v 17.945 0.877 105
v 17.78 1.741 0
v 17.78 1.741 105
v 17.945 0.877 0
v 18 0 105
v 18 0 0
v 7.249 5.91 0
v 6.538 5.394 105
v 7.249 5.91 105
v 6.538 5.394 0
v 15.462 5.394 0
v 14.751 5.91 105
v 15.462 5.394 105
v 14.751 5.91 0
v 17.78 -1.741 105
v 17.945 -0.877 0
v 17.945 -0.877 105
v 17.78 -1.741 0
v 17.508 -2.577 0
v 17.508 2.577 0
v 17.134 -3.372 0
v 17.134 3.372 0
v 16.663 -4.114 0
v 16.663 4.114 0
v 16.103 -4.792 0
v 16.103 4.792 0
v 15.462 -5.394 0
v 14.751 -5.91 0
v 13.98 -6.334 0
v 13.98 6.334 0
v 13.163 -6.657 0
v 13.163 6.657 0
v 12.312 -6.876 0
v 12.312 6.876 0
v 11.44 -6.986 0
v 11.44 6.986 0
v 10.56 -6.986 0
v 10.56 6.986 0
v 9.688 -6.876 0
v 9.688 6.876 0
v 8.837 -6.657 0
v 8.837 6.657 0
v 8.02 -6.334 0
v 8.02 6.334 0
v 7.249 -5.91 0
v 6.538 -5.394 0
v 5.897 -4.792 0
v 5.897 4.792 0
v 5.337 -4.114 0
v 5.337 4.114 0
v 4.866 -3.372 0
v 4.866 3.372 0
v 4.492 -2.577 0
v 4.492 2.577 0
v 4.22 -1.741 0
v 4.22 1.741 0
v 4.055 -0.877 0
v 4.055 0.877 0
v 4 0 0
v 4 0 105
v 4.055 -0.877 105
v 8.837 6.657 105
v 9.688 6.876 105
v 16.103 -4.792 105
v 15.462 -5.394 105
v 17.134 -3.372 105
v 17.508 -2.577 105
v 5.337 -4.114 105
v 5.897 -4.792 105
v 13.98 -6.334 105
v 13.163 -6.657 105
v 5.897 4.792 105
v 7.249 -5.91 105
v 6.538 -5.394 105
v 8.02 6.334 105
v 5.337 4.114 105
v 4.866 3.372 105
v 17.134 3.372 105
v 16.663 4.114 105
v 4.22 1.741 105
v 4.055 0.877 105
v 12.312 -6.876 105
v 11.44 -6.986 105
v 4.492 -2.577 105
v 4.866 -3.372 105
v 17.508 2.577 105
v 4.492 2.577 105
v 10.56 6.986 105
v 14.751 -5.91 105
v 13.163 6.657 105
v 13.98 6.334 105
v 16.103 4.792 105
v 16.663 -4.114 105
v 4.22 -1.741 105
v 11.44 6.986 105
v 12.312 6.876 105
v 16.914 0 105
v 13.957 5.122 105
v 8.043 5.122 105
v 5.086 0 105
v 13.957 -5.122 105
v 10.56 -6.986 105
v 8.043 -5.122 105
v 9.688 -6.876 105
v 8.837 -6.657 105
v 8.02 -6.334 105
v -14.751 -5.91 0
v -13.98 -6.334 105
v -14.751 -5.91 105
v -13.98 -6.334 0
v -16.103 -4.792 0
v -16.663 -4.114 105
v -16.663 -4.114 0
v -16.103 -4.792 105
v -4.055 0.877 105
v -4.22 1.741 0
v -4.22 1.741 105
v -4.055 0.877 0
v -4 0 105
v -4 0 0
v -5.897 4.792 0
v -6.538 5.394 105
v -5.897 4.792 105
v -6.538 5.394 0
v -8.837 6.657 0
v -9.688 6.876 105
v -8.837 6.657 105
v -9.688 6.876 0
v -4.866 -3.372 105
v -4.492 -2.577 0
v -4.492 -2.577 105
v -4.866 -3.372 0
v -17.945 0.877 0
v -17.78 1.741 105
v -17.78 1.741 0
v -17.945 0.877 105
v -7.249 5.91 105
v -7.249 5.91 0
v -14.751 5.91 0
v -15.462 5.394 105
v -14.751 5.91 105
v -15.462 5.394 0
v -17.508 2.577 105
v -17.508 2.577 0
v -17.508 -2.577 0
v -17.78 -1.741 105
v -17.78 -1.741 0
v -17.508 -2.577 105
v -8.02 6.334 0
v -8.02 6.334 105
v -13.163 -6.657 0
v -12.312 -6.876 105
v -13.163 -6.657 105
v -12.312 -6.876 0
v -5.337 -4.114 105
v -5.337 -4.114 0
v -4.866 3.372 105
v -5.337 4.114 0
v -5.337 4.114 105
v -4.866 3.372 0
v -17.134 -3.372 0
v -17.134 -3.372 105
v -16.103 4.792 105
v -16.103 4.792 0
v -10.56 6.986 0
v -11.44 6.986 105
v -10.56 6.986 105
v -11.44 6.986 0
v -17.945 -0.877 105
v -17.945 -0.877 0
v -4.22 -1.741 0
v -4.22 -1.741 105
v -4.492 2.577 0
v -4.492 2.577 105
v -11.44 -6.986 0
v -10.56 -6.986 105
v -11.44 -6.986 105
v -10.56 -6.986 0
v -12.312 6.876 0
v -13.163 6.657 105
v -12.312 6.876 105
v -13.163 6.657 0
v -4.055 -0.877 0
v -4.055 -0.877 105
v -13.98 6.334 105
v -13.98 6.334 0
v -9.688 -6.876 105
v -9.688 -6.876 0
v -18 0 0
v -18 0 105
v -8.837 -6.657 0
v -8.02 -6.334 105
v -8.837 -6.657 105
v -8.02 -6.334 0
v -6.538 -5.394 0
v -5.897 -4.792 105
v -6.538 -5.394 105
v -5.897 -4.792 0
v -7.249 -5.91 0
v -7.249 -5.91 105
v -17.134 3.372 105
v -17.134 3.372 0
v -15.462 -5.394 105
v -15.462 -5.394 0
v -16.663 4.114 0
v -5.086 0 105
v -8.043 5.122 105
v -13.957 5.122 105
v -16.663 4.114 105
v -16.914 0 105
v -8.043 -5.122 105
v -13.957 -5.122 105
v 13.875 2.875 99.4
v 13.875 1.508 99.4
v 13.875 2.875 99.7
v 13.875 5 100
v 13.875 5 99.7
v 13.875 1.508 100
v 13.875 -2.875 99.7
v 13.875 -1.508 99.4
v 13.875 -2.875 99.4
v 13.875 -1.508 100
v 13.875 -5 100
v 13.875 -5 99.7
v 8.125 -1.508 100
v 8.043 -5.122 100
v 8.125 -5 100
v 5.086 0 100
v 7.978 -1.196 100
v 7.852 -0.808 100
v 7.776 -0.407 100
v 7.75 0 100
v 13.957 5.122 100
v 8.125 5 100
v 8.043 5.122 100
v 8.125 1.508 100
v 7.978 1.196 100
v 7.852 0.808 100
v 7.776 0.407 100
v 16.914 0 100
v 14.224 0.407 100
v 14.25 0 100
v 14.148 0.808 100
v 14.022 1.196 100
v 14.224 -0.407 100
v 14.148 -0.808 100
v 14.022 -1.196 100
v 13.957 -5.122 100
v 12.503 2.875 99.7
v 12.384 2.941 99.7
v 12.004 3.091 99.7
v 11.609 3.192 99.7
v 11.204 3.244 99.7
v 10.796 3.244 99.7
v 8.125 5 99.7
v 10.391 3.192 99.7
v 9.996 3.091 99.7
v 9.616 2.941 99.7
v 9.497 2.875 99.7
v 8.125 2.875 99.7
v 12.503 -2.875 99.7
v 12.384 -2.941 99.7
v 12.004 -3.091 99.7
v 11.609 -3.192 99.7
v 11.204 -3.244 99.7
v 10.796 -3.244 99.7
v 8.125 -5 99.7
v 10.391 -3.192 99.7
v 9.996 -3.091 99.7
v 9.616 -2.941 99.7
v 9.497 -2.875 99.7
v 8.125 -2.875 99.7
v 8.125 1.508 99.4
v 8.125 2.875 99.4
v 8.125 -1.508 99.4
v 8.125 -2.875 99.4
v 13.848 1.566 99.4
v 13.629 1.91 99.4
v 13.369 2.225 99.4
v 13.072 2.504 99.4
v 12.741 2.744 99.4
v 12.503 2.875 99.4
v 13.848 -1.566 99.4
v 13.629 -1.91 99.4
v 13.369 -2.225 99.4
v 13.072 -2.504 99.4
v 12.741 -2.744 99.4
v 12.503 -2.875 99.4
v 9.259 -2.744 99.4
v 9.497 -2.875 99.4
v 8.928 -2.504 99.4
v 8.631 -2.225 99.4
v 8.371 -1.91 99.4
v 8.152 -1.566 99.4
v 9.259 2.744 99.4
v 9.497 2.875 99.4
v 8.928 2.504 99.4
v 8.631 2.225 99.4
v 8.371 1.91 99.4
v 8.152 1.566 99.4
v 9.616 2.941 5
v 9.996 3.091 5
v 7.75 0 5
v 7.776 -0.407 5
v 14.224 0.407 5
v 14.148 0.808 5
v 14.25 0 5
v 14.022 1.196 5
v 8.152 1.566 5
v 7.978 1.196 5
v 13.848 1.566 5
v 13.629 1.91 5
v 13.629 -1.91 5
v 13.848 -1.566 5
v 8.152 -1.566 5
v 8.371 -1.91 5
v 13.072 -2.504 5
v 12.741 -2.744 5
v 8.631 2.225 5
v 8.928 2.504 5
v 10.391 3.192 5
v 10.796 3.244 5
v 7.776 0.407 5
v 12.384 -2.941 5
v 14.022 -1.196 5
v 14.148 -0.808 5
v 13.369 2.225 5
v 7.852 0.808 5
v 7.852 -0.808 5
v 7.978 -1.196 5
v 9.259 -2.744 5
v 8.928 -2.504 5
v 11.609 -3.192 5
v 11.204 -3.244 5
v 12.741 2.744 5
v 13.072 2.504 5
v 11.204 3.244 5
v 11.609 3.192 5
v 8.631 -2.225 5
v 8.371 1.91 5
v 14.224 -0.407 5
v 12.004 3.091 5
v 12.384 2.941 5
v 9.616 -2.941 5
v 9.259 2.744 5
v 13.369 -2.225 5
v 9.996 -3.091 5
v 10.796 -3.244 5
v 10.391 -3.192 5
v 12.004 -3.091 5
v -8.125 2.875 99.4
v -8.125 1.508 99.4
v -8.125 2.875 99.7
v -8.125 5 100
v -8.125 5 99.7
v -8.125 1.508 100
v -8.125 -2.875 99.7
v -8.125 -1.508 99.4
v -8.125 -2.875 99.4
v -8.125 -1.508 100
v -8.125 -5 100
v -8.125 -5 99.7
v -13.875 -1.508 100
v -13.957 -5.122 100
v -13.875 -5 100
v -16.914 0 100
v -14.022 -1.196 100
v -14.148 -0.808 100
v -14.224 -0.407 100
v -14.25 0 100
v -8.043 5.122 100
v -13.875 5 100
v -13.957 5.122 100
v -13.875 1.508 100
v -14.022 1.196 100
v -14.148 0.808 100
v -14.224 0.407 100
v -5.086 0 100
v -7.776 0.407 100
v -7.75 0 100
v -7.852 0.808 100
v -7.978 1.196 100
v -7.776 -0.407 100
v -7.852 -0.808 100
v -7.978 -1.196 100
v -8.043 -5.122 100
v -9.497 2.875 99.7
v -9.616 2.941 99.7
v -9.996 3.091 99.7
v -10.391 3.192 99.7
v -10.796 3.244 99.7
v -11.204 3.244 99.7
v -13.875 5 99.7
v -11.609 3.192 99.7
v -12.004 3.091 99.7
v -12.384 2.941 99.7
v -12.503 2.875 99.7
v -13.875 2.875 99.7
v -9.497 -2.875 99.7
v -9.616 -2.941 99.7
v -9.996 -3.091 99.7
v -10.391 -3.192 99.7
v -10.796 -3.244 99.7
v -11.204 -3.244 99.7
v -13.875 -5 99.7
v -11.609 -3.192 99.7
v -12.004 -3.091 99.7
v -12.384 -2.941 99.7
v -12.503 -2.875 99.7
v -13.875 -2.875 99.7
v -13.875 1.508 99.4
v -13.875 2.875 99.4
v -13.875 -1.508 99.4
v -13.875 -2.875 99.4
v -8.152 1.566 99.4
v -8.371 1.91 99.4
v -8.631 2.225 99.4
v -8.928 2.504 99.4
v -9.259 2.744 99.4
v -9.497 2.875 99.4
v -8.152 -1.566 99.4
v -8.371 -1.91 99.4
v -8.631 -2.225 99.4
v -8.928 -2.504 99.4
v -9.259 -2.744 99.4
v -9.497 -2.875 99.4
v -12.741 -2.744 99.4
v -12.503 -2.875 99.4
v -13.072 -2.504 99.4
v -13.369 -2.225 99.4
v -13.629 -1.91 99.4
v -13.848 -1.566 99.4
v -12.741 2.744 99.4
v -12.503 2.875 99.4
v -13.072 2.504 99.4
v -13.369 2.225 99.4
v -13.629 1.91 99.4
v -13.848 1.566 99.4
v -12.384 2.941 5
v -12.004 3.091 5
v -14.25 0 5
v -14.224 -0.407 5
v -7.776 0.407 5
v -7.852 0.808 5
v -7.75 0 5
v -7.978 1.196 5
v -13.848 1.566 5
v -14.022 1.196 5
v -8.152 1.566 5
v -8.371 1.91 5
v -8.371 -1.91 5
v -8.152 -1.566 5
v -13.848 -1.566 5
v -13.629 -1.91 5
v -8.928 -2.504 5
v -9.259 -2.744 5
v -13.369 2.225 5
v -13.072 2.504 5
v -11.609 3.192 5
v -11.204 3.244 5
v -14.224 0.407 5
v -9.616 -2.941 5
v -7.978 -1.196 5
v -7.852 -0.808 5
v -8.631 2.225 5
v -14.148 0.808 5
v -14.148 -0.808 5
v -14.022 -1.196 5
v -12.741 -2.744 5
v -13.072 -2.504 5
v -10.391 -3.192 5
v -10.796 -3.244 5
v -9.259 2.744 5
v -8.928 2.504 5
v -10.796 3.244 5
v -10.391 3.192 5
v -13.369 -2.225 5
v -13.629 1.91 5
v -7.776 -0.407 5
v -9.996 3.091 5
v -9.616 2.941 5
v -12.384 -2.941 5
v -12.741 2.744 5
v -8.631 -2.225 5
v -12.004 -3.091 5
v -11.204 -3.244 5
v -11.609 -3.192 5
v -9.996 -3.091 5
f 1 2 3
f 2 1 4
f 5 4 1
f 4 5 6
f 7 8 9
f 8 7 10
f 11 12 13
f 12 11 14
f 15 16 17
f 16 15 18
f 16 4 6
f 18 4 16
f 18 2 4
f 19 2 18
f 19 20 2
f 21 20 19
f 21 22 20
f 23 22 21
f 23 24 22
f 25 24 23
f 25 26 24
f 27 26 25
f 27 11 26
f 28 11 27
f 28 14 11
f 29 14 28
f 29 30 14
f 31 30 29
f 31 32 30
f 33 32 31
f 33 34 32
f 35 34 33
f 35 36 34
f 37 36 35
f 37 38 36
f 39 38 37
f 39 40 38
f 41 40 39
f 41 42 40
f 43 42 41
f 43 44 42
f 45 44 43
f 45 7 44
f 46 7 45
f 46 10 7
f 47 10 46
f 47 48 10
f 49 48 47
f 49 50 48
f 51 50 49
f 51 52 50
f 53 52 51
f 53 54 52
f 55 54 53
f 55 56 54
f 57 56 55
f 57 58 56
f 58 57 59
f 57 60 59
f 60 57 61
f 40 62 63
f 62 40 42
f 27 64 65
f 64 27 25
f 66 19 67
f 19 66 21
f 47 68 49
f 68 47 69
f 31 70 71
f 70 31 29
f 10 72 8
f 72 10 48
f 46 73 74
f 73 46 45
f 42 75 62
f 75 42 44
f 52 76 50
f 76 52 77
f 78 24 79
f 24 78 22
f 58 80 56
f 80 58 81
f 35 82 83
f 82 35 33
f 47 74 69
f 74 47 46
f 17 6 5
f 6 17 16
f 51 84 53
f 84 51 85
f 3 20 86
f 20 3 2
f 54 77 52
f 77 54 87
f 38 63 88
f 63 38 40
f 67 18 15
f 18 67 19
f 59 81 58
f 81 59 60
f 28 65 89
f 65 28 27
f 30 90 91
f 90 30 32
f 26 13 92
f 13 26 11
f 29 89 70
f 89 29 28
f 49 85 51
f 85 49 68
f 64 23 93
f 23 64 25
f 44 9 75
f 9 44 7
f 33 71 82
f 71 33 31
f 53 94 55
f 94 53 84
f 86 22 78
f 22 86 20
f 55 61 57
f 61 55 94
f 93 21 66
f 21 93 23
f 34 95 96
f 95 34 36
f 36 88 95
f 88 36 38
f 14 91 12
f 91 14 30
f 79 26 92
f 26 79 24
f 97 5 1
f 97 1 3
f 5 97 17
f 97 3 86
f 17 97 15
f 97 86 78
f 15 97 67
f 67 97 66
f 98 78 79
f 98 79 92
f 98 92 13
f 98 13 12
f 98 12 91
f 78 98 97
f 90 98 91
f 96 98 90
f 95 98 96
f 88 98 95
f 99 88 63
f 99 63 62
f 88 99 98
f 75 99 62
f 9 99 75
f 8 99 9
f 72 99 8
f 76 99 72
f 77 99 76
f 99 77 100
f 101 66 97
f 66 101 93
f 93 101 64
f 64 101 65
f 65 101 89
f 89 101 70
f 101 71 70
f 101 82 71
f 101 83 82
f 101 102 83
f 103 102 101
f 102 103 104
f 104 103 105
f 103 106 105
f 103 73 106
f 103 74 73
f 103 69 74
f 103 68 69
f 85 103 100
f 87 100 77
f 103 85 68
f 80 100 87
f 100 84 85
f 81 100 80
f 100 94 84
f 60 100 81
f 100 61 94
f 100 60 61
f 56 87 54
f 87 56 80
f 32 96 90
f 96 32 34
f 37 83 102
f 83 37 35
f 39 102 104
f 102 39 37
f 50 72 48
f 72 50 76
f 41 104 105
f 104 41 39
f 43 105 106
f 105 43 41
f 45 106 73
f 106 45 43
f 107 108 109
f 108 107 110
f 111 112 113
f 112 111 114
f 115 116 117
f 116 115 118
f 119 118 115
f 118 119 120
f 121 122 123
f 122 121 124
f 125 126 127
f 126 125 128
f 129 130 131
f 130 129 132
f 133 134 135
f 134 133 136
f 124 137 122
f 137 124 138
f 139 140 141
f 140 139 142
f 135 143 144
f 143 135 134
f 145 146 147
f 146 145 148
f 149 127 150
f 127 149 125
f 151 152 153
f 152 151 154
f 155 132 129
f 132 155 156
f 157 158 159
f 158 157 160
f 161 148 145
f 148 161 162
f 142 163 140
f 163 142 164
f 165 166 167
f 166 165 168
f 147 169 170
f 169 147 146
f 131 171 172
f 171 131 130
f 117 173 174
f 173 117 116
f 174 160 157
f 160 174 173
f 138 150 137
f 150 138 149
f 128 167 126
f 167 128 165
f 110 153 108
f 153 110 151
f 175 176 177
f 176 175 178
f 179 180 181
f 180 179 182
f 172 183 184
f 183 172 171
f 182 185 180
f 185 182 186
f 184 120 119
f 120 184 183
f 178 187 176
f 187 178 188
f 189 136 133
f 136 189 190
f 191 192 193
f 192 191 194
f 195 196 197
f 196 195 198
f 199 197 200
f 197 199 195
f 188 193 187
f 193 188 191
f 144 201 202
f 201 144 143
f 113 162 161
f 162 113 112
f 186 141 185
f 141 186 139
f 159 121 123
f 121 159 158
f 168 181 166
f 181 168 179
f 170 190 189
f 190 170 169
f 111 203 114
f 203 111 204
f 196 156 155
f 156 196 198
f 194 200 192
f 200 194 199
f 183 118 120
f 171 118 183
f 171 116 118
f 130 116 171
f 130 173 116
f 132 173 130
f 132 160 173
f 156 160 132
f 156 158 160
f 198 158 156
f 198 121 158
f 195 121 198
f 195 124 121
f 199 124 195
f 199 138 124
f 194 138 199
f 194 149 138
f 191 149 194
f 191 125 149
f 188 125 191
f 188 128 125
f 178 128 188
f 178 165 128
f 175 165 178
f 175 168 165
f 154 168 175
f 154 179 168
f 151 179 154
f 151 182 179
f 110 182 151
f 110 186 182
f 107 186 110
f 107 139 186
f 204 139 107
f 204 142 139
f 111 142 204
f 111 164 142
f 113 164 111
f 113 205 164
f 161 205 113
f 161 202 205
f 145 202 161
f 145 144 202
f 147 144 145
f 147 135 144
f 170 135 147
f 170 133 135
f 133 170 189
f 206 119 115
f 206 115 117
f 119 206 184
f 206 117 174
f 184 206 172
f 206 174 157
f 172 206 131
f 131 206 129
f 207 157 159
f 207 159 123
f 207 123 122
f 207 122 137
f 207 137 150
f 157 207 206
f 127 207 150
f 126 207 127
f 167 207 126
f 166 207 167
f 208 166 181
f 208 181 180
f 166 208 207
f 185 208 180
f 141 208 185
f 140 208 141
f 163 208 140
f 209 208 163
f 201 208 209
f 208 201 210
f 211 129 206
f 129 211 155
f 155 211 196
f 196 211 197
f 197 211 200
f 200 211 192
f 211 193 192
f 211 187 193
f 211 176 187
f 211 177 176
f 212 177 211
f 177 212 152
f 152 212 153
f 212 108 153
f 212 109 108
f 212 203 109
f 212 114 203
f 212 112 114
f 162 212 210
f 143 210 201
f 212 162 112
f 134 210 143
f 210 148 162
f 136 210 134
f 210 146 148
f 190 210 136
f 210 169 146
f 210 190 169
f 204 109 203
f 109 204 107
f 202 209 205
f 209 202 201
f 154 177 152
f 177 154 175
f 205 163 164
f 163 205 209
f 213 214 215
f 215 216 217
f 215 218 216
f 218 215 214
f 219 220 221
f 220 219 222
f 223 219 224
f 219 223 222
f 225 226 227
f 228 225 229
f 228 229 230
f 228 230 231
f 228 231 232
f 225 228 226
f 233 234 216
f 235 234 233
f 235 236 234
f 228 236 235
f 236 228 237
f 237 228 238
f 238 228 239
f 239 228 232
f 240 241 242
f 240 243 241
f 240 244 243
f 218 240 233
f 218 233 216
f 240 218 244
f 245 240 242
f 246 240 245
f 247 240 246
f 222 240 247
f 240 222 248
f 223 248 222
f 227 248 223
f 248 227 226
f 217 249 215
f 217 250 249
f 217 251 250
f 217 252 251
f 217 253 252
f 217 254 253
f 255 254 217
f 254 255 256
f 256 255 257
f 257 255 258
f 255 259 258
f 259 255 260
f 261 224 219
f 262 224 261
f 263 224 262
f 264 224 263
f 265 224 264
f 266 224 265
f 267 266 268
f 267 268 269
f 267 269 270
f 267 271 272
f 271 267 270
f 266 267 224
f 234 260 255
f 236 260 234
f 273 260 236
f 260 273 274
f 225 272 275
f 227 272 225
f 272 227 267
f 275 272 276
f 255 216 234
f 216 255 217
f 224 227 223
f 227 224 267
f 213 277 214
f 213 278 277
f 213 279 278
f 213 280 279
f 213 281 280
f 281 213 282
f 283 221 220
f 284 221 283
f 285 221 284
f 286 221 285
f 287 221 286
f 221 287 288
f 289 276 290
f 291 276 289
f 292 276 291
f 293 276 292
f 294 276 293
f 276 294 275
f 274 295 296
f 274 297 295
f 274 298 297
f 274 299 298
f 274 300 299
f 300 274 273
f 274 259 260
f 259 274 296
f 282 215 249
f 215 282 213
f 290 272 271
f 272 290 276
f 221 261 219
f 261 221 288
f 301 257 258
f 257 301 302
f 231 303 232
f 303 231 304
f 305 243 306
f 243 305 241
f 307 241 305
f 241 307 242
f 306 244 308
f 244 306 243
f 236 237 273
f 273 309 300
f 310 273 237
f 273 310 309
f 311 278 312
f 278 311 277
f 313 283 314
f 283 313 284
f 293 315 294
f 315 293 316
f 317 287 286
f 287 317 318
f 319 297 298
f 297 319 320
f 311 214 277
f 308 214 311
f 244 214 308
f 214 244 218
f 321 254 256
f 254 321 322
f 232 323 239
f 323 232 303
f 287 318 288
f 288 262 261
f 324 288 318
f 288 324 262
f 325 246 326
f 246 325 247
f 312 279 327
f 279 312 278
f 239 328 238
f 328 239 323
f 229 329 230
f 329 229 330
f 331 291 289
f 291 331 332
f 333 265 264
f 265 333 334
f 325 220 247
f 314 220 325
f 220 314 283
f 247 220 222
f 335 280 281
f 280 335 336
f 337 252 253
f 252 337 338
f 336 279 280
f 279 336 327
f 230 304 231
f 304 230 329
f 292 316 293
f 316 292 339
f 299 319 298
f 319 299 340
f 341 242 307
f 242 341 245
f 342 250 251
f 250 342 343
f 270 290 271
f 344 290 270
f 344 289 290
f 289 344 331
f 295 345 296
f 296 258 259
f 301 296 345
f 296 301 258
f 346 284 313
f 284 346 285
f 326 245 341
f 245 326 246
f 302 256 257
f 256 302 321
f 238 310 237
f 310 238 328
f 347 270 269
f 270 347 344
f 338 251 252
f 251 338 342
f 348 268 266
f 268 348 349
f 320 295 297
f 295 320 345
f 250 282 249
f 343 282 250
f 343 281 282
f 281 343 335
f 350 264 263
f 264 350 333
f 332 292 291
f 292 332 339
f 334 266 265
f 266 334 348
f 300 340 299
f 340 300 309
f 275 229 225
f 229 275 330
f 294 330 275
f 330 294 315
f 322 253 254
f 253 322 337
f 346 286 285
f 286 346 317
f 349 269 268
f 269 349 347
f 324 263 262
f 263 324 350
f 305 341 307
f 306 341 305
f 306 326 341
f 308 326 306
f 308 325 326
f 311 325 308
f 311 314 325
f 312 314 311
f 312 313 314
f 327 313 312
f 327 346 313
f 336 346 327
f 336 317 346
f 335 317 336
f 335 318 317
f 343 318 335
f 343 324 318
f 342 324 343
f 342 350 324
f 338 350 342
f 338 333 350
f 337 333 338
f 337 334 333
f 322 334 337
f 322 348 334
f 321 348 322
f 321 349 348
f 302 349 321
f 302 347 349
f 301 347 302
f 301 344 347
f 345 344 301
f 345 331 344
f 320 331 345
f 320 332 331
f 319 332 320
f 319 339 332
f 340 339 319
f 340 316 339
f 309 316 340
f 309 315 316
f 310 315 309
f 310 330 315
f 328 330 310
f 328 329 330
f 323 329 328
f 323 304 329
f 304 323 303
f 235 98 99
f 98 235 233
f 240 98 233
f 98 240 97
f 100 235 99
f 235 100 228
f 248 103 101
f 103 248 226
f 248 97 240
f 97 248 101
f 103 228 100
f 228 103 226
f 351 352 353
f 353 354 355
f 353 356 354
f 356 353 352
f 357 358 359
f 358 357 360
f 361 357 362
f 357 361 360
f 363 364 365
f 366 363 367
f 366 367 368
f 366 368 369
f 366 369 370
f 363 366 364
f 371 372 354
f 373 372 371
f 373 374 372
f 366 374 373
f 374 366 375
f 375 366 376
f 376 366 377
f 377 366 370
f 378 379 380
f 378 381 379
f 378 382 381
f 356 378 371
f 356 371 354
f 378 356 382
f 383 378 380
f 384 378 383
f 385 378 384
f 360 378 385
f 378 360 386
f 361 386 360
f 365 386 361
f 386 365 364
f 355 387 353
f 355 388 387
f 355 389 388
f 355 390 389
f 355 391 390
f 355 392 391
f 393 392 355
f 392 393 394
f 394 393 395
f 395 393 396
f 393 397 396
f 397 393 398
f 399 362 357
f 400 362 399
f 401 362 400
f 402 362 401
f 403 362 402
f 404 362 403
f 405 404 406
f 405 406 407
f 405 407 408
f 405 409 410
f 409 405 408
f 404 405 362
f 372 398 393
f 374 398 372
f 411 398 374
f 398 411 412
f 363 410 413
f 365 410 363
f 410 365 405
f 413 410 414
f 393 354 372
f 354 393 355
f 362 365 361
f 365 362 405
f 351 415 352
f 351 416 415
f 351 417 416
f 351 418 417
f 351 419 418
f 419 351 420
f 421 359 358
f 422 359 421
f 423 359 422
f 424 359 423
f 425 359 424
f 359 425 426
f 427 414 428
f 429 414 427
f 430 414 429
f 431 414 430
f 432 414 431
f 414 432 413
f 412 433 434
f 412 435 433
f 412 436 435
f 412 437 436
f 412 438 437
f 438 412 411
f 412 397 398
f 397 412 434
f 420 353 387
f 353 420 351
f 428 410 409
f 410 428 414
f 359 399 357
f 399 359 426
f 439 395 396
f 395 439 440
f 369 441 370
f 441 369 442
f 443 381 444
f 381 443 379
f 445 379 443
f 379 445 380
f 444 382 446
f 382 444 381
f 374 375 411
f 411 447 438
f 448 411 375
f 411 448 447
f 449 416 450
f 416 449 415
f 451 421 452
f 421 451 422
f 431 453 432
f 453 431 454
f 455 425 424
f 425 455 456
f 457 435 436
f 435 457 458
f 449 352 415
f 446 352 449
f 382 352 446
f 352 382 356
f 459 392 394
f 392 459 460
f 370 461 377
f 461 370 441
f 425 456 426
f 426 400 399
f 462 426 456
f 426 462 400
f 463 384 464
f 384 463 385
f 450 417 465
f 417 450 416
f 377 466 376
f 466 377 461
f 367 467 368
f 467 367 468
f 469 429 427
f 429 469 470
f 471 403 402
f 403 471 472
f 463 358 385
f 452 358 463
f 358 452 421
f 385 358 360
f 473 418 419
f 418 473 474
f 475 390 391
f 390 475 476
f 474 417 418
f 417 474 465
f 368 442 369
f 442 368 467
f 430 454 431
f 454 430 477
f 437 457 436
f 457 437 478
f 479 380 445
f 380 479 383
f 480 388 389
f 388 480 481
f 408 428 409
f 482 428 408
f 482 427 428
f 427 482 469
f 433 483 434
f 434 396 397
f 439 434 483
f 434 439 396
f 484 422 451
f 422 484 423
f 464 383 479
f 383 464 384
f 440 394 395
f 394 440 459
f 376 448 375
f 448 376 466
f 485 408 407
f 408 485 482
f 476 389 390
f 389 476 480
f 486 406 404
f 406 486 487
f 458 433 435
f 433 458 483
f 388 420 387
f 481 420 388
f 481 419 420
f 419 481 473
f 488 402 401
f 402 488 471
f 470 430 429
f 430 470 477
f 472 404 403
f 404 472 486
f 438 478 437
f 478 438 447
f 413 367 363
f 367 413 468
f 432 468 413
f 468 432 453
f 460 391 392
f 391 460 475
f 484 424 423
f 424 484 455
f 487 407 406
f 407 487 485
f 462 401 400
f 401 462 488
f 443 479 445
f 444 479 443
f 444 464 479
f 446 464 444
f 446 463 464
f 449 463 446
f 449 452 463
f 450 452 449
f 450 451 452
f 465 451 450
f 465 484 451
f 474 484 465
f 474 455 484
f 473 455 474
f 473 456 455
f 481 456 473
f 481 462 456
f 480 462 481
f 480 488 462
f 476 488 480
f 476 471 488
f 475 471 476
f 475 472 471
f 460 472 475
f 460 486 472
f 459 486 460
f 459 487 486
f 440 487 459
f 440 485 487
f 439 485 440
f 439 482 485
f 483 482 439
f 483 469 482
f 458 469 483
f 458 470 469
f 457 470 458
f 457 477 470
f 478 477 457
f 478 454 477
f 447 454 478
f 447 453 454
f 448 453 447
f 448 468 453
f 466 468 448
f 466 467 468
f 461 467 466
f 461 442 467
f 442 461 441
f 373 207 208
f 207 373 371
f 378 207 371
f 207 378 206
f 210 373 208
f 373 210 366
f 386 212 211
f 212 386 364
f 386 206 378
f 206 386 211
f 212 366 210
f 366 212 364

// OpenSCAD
$fn = 50;


difference() {
	union() {
		translate(v = [11.0000000000, 0, 0.0000000000]) {
			cylinder(h = 105, r = 7.0000000000);
		}
		translate(v = [-11.0000000000, 0, 0.0000000000]) {
			cylinder(h = 105, r = 7.0000000000);
		}
	}
	union() {
		translate(v = [11.0000000000, 0, 105]) {
			rotate(a = [0, 0, 0]) {
				difference() {
					union() {
						#translate(v = [-2.8750000000, -5.0000000000, -5.3000000000]) {
							cube(size = [5.7500000000, 10, 0.3000000000]);
						}
						#translate(v = [-2.8750000000, -2.8750000000, -5.6000000000]) {
							cube(size = [5.7500000000, 5.7500000000, 0.3000000000]);
						}
						#translate(v = [-2.8750000000, -5.0000000000, 0]) {
							cube(size = [5.7500000000, 10, 0.3000000000]);
						}
						#translate(v = [-2.8750000000, -2.8750000000, 0.3000000000]) {
							cube(size = [5.7500000000, 5.7500000000, 0.3000000000]);
						}
						#translate(v = [0, 0, -100.0000000000]) {
							cylinder(h = 200, r = 3.2500000000);
						}
						translate(v = [0, 0, -5]) {
							#linear_extrude(height = 5) {
								polygon(points = [[5.9142500000, 0.0000000000], [2.9571250000, 5.1218907443], [-2.9571250000, 5.1218907443], [-5.9142500000, 0.0000000000], [-2.9571250000, -5.1218907443], [2.9571250000, -5.1218907443]]);
							}
						}
						#translate(v = [-2.8750000000, -5.0000000000, -5.3000000000]) {
							cube(size = [5.7500000000, 10, 0.3000000000]);
						}
						#translate(v = [-2.8750000000, -2.8750000000, -5.6000000000]) {
							cube(size = [5.7500000000, 5.7500000000, 0.3000000000]);
						}
						#translate(v = [-2.8750000000, -5.0000000000, 0]) {
							cube(size = [5.7500000000, 10, 0.3000000000]);
						}
						#translate(v = [-2.8750000000, -2.8750000000, 0.3000000000]) {
							cube(size = [5.7500000000, 5.7500000000, 0.3000000000]);
						}
						#translate(v = [0, 0, -100.0000000000]) {
							cylinder(h = 200, r = 3.2500000000);
						}
						#translate(v = [-2.8750000000, -5.0000000000, -5.3000000000]) {
							cube(size = [5.7500000000, 10, 0.3000000000]);
						}
						#translate(v = [-2.8750000000, -2.8750000000, -5.6000000000]) {
							cube(size = [5.7500000000, 5.7500000000, 0.3000000000]);
						}
						#translate(v = [-2.8750000000, -5.0000000000, 0]) {
							cube(size = [5.7500000000, 10, 0.3000000000]);
						}
						#translate(v = [-2.8750000000, -2.8750000000, 0.3000000000]) {
							cube(size = [5.7500000000, 5.7500000000, 0.3000000000]);
						}
						#translate(v = [0, 0, -100.0000000000]) {
							cylinder(h = 200, r = 3.2500000000);
						}
					}
					union();
				}
			}
		}
		translate(v = [-11.0000000000, 0, 105]) {
			rotate(a = [0, 0, 0]) {
				difference() {
					union() {
						#translate(v = [-2.8750000000, -5.0000000000, -5.3000000000]) {
							cube(size = [5.7500000000, 10, 0.3000000000]);
						}
						#translate(v = [-2.8750000000, -2.8750000000, -5.6000000000]) {
							cube(size = [5.7500000000, 5.7500000000, 0.3000000000]);
						}
						#translate(v = [-2.8750000000, -5.0000000000, 0]) {
							cube(size = [5.7500000000, 10, 0.3000000000]);
						}
						#translate(v = [-2.8750000000, -2.8750000000, 0.3000000000]) {
							cube(size = [5.7500000000, 5.7500000000, 0.3000000000]);
						}
						#translate(v = [0, 0, -100.0000000000]) {
							cylinder(h = 200, r = 3.2500000000);
						}
						translate(v = [0, 0, -5]) {
							#linear_extrude(height = 5) {
								polygon(points = [[5.9142500000, 0.0000000000], [2.9571250000, 5.1218907443], [-2.9571250000, 5.1218907443], [-5.9142500000, 0.0000000000], [-2.9571250000, -5.1218907443], [2.9571250000, -5.1218907443]]);
							}
						}
						#translate(v = [-2.8750000000, -5.0000000000, -5.3000000000]) {
							cube(size = [5.7500000000, 10, 0.3000000000]);
						}
						#translate(v = [-2.8750000000, -2.8750000000, -5.6000000000]) {
							cube(size = [5.7500000000, 5.7500000000, 0.3000000000]);
						}
						#translate(v = [-2.8750000000, -5.0000000000, 0]) {
							cube(size = [5.7500000000, 10, 0.3000000000]);
						}
						#translate(v = [-2.8750000000, -2.8750000000, 0.3000000000]) {
							cube(size = [5.7500000000, 5.7500000000, 0.3000000000]);
						}
						#translate(v = [0, 0, -100.0000000000]) {
							cylinder(h = 200, r = 3.2500000000);
						}
						#translate(v = [-2.8750000000, -5.0000000000, -5.3000000000]) {
							cube(size = [5.7500000000, 10, 0.3000000000]);
						}
						#translate(v = [-2.8750000000, -2.8750000000, -5.6000000000]) {
							cube(size = [5.7500000000, 5.7500000000, 0.3000000000]);
						}
						#translate(v = [-2.8750000000, -5.0000000000, 0]) {
							cube(size = [5.7500000000, 10, 0.3000000000]);
						}
						#translate(v = [-2.8750000000, -2.8750000000, 0.3000000000]) {
							cube(size = [5.7500000000, 5.7500000000, 0.3000000000]);
						}
						#translate(v = [0, 0, -100.0000000000]) {
							cylinder(h = 200, r = 3.2500000000);
						}
					}
					union();
				}
			}
		}
	}
}
